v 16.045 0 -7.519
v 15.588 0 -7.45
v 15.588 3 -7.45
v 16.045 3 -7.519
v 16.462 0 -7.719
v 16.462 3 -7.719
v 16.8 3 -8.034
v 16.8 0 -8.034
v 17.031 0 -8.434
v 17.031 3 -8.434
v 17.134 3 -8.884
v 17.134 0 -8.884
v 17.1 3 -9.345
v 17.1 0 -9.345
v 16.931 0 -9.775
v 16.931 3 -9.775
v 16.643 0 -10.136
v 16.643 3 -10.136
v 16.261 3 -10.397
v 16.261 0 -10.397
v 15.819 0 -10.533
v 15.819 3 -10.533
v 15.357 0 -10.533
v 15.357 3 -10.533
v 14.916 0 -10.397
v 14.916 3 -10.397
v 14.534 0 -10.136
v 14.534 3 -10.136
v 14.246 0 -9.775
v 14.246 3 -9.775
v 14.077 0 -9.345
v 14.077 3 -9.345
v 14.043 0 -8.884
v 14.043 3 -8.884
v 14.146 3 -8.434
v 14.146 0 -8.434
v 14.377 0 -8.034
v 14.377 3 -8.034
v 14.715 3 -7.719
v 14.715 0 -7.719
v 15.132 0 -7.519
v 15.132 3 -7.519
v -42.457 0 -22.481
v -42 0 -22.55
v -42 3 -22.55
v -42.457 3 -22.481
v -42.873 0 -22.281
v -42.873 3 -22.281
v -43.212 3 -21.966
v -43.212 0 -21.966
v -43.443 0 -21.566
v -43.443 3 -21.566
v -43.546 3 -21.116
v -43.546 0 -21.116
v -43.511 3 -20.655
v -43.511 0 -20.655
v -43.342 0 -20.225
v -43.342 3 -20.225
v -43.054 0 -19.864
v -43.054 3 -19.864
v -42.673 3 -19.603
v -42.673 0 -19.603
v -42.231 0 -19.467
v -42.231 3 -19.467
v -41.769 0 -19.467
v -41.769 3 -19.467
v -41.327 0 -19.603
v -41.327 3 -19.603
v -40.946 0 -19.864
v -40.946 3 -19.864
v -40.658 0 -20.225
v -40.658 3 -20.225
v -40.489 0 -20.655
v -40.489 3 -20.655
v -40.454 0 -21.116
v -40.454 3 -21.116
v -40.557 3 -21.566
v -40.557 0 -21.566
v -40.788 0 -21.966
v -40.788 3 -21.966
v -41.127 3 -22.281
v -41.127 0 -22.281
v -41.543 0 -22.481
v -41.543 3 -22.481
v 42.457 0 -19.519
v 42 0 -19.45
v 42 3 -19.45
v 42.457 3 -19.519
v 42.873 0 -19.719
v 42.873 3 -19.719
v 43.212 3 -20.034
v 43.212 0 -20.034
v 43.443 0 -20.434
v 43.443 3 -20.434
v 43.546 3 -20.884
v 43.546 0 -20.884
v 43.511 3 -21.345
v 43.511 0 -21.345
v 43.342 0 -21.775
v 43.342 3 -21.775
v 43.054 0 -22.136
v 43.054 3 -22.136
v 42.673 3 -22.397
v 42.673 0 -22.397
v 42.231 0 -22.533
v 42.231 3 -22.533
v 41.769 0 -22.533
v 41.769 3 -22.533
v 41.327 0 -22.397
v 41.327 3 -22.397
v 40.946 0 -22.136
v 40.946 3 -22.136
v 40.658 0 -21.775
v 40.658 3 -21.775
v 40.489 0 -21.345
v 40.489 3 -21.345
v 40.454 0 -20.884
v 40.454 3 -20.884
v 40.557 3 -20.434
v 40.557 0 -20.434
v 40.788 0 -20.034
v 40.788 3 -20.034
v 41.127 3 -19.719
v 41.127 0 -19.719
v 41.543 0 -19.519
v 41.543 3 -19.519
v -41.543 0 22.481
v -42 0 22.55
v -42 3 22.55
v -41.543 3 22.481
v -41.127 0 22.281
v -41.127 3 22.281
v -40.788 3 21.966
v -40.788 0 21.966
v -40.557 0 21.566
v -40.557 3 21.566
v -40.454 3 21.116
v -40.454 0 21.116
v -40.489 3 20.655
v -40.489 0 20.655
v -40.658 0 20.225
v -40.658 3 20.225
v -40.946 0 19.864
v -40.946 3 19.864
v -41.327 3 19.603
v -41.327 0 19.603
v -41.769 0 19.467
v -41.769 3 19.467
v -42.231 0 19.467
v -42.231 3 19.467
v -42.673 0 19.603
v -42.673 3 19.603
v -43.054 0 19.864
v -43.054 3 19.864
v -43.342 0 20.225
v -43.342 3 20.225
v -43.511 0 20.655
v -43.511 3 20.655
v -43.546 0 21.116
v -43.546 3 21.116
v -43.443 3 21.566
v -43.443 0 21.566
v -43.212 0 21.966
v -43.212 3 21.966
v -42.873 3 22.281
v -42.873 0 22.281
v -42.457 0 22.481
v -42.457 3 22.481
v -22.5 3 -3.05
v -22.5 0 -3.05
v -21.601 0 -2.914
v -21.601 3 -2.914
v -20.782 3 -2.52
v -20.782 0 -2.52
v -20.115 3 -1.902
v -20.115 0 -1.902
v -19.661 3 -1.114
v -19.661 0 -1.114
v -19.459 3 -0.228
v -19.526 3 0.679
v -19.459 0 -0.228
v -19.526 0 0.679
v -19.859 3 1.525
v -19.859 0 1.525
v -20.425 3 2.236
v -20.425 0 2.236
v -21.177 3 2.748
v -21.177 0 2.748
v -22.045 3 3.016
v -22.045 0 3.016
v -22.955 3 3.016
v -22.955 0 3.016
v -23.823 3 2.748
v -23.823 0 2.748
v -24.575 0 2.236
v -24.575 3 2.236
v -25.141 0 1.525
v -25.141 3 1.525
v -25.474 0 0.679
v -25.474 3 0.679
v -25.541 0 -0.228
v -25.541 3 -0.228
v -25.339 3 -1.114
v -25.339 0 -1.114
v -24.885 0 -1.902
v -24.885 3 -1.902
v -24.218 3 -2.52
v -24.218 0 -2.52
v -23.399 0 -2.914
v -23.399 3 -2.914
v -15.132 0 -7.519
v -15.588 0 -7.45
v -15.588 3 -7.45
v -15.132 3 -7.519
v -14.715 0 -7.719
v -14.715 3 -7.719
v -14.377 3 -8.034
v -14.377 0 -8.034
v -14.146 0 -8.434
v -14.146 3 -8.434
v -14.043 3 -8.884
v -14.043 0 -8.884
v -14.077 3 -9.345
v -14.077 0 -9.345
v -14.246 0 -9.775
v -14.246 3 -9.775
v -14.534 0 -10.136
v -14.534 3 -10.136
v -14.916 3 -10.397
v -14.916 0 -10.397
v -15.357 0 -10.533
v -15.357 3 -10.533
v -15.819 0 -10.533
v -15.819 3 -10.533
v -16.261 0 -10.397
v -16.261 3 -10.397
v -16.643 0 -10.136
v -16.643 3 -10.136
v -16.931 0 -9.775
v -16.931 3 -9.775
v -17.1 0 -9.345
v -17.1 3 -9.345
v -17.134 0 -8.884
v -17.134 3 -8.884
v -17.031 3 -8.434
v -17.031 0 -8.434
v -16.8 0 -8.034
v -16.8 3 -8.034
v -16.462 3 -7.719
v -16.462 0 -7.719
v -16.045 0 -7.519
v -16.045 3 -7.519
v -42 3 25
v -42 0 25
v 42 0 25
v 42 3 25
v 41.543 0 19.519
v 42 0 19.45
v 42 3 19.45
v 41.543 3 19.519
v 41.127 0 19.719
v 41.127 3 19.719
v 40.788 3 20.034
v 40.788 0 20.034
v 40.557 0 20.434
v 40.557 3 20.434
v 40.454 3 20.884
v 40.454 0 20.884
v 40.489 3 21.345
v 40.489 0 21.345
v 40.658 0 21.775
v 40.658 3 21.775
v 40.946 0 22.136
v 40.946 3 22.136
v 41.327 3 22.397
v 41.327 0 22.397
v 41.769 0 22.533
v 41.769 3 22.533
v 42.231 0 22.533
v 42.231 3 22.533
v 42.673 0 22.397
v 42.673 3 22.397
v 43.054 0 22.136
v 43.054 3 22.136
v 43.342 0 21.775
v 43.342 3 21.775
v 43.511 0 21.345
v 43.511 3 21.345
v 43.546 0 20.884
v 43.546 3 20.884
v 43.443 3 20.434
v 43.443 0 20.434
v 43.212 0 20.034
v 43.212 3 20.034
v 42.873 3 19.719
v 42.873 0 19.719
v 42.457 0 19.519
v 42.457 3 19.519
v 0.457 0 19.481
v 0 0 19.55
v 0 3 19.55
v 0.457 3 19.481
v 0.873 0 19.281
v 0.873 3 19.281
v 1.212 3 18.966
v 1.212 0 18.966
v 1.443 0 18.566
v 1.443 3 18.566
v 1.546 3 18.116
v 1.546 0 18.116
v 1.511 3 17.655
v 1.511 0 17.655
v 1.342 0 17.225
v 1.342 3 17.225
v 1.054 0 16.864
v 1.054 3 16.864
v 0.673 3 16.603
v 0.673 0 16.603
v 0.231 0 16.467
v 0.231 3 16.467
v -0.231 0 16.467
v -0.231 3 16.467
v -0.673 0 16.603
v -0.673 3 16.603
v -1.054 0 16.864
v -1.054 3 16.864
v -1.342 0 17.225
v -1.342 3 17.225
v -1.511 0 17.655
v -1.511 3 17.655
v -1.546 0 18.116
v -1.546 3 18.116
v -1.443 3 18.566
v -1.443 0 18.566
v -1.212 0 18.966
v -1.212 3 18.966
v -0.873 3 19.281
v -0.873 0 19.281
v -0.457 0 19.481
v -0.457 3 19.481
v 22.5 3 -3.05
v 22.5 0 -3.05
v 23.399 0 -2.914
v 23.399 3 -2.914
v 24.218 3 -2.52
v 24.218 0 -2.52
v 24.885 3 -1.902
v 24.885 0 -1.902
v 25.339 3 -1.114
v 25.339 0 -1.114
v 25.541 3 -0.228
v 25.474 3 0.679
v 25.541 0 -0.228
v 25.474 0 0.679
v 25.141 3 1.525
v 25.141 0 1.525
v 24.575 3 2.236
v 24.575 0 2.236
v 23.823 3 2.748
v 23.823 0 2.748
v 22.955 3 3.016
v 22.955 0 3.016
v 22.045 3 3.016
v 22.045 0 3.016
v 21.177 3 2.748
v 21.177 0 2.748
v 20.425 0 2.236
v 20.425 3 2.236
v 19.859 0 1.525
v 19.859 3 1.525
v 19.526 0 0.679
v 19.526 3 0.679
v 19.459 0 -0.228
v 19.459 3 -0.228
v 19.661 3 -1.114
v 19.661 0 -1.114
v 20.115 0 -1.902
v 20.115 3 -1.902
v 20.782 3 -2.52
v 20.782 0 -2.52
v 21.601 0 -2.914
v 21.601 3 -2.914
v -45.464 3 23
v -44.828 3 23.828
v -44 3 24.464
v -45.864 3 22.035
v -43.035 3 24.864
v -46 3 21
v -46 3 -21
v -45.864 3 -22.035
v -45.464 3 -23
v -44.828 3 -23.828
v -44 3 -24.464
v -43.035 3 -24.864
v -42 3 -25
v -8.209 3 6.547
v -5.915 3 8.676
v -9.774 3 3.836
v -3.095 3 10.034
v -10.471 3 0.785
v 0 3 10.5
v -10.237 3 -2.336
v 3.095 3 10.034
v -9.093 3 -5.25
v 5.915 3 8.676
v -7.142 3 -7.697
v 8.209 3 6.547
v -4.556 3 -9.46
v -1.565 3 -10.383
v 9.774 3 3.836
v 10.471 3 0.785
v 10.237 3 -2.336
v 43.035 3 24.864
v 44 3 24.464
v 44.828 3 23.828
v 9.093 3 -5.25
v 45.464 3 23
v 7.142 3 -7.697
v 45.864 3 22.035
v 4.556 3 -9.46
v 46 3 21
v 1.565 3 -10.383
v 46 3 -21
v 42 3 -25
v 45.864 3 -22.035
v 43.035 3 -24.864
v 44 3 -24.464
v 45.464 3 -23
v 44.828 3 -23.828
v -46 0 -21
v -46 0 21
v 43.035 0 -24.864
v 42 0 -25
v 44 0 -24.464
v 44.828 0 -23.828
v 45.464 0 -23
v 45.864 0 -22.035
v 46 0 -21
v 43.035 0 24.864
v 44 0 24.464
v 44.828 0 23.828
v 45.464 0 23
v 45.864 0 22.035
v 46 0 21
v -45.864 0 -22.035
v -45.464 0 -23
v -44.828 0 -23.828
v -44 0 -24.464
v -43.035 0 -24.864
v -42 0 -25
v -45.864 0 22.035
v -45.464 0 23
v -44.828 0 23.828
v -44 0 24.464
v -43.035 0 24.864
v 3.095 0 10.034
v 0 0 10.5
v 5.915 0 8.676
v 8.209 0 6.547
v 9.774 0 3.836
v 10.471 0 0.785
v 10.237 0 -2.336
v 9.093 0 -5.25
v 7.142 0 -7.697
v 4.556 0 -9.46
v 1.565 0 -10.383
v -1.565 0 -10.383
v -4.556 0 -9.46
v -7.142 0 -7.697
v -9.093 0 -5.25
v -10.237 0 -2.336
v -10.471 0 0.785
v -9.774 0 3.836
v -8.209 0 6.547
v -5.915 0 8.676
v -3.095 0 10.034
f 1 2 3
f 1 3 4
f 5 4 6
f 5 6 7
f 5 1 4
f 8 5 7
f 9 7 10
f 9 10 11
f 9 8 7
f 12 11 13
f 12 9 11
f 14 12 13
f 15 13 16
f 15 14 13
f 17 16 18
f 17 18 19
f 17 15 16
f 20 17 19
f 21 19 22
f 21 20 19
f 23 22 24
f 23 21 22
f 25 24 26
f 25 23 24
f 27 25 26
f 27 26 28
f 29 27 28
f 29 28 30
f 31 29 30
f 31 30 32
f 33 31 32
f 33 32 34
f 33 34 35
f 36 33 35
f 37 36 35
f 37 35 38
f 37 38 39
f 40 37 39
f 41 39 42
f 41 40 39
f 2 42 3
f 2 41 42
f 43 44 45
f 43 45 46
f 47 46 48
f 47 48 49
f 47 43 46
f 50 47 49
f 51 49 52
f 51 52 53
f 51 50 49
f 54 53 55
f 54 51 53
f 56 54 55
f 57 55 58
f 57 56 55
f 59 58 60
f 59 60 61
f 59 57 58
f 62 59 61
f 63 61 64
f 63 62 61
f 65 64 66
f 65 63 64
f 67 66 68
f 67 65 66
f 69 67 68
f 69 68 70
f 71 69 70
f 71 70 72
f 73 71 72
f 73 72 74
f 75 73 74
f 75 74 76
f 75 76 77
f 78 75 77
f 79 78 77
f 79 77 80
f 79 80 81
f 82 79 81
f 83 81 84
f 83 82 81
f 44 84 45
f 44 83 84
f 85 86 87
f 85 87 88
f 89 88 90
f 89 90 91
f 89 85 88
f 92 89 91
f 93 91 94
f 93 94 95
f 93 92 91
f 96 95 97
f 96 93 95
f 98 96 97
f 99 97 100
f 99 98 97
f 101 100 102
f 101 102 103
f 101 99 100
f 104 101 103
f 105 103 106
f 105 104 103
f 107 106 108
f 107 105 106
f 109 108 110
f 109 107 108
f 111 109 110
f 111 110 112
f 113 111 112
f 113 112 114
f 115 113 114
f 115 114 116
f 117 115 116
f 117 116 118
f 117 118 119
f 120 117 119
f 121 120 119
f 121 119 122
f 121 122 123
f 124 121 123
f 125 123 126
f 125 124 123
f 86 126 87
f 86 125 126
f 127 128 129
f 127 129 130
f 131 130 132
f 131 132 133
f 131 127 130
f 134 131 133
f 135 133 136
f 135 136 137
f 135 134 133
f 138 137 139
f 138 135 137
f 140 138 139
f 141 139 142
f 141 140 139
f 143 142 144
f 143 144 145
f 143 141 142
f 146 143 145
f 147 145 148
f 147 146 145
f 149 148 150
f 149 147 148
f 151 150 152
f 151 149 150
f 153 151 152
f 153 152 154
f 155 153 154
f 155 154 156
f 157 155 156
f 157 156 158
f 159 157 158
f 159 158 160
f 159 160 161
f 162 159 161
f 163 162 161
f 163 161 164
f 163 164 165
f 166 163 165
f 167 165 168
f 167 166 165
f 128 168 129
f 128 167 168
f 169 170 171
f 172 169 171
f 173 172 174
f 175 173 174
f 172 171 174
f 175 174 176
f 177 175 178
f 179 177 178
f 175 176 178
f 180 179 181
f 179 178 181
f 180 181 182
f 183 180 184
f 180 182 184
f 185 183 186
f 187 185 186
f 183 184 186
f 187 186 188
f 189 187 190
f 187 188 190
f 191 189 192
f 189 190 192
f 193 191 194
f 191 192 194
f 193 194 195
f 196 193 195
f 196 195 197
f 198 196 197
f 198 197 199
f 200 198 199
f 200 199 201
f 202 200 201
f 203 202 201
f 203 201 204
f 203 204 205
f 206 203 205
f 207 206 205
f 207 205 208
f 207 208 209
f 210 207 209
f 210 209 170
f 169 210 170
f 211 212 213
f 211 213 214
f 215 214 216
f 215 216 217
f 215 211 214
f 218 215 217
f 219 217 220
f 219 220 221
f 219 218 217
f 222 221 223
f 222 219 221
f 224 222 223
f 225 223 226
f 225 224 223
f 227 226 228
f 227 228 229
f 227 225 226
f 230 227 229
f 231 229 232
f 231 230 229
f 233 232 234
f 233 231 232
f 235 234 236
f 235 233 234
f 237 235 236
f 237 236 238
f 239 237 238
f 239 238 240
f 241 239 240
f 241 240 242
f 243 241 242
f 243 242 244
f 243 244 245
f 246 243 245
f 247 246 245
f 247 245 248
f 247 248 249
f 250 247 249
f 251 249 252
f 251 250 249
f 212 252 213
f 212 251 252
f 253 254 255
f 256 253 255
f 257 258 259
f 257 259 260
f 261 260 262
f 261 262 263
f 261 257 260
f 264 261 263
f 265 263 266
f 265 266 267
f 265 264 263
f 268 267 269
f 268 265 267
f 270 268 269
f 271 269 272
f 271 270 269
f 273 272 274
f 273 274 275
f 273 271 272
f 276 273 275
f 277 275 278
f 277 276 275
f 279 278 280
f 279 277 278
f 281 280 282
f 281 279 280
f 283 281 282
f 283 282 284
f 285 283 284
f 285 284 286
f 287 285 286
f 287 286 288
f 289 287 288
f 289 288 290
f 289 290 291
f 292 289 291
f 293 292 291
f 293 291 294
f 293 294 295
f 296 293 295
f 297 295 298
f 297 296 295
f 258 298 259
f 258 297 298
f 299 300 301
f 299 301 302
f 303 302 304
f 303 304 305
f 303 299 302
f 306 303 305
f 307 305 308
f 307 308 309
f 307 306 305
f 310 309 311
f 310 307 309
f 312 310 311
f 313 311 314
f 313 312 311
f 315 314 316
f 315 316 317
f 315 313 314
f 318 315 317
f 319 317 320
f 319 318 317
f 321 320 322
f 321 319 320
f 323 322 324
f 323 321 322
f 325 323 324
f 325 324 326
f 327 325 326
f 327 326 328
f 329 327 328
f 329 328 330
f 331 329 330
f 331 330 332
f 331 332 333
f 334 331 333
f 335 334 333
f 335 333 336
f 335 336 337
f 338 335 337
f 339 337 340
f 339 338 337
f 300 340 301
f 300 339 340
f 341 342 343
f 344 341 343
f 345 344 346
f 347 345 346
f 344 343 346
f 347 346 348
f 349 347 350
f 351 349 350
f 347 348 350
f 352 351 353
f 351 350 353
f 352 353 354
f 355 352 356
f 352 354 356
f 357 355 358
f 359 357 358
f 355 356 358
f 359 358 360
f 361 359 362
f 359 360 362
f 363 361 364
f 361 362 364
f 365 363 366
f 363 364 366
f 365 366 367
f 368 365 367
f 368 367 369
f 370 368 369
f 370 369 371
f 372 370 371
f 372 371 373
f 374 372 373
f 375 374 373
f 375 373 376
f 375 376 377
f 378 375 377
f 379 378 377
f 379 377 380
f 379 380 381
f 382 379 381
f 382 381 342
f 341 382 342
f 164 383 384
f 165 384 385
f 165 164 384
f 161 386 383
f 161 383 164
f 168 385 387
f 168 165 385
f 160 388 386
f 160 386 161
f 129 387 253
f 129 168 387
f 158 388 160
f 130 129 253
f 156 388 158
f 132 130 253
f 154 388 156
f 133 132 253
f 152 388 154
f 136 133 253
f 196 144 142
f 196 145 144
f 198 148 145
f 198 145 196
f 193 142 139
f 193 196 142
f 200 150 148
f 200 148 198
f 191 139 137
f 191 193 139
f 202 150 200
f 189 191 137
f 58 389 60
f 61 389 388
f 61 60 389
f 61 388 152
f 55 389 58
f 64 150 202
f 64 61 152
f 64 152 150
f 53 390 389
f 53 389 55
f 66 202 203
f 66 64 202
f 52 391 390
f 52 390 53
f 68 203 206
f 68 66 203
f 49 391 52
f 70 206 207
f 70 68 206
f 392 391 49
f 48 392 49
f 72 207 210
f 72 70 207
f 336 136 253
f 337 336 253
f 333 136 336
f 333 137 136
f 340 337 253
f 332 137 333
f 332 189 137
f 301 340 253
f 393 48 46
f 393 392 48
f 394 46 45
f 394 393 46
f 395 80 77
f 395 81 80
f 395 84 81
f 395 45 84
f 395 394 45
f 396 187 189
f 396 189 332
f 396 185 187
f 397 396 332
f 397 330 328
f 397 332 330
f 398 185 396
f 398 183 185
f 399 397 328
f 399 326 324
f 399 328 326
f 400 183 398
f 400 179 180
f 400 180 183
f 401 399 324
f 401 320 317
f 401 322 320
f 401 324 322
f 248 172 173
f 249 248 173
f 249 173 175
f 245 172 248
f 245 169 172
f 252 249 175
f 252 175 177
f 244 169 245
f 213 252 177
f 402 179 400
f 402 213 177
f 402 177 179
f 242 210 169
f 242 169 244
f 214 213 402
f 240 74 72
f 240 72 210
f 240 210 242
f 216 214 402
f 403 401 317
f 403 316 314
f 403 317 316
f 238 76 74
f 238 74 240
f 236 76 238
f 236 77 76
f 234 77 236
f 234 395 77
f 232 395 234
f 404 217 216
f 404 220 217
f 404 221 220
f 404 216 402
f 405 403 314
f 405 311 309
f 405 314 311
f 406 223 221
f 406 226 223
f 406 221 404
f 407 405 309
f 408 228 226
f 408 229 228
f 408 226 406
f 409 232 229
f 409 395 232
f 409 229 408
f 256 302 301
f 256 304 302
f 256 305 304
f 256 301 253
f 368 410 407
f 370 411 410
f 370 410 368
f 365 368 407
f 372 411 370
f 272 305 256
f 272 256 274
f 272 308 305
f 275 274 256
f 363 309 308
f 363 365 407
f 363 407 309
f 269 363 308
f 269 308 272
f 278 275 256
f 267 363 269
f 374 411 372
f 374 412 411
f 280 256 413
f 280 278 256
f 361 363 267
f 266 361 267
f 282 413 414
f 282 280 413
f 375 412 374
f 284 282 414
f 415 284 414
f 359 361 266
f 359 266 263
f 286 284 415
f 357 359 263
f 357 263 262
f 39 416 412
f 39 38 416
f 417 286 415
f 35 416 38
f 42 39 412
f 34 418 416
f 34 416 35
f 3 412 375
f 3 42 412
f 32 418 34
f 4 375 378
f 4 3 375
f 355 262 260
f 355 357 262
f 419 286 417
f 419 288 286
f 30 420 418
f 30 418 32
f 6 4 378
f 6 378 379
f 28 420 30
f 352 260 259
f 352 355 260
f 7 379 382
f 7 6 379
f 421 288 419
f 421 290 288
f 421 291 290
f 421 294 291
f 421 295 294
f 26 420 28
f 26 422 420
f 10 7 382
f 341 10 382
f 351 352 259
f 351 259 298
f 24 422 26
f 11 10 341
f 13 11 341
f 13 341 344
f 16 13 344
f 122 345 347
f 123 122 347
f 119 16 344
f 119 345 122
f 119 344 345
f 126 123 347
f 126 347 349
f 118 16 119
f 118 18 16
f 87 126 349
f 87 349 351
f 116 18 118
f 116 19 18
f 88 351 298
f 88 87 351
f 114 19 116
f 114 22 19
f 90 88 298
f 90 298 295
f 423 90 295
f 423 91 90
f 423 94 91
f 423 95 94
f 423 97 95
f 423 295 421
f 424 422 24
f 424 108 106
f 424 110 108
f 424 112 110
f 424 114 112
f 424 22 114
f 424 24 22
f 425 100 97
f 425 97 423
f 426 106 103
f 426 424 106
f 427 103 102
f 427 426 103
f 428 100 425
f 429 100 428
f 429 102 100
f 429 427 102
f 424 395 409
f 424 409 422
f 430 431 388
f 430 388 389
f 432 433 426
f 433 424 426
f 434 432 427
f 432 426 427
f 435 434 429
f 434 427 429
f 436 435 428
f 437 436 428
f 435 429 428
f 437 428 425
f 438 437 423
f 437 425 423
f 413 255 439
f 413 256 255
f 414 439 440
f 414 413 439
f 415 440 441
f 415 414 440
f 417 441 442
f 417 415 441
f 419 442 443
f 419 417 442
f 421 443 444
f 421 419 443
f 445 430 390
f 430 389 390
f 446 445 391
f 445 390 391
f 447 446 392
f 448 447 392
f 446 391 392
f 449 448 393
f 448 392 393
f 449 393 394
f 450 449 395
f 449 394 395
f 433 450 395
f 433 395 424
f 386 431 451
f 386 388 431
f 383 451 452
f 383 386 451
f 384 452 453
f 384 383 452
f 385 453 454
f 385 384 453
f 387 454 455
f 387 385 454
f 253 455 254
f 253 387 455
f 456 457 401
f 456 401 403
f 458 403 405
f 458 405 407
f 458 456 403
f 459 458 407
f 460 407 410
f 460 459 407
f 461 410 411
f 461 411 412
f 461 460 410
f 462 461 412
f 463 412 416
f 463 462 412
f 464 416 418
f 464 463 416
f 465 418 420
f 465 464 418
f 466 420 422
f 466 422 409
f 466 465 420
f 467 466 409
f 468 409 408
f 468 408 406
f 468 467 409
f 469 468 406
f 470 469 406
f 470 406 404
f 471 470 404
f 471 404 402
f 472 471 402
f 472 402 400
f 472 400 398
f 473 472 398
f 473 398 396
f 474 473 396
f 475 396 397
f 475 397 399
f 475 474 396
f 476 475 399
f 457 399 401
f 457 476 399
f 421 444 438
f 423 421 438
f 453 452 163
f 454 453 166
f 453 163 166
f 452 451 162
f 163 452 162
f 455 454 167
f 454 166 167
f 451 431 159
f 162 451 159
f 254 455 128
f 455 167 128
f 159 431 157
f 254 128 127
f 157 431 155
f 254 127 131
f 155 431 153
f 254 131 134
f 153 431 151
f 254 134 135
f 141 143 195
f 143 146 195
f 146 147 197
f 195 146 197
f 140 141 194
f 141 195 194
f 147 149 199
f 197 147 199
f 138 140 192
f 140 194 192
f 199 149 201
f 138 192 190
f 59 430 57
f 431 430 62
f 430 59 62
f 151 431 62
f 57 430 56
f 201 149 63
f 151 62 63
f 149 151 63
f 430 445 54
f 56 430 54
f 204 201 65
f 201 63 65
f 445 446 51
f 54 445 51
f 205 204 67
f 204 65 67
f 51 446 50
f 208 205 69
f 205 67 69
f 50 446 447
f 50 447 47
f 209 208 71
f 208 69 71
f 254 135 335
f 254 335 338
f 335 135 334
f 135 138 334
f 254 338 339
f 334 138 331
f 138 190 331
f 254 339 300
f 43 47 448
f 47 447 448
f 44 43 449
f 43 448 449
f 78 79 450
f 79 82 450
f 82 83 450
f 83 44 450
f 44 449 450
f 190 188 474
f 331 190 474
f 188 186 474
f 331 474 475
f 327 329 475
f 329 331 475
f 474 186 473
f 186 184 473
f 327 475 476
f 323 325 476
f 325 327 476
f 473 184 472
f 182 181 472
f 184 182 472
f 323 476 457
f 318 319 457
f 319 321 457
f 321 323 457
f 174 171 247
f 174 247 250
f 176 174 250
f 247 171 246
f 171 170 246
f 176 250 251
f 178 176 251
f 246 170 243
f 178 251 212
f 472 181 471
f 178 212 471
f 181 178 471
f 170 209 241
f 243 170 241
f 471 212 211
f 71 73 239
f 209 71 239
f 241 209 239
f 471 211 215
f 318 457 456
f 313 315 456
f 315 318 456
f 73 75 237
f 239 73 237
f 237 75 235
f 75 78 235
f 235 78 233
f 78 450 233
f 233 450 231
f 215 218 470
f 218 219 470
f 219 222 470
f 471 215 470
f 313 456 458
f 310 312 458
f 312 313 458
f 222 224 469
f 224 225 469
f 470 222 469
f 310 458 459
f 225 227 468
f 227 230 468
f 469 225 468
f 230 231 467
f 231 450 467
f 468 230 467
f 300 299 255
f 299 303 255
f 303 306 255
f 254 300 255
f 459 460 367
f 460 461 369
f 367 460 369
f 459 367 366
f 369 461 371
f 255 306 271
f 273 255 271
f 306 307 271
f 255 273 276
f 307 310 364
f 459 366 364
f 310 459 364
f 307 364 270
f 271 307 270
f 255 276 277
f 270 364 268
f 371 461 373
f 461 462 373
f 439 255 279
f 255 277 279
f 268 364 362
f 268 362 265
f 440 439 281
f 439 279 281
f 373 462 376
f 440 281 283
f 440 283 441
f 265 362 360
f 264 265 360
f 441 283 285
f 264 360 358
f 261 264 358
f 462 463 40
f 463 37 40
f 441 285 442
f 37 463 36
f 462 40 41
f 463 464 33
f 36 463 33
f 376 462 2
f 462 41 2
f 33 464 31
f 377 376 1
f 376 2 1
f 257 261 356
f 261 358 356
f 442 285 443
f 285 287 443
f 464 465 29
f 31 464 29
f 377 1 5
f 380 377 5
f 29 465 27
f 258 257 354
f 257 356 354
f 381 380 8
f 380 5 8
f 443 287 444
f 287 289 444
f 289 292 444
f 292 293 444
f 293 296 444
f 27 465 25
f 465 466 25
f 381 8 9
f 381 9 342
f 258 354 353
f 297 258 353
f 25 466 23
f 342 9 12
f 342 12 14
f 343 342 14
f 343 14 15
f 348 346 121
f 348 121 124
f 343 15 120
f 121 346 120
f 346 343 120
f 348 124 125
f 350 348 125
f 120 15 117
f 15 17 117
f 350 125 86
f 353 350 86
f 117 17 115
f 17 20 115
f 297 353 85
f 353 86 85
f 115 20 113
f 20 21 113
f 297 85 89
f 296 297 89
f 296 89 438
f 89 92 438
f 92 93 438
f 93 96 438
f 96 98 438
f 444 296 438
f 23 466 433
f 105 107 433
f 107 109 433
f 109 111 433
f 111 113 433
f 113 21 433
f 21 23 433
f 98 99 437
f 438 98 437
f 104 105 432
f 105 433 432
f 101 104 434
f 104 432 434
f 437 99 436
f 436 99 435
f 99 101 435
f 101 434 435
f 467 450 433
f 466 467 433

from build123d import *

# Parameters (mm, degrees)
SKETCH1_W           = 92
SKETCH1_H           = 50
SKETCH1_R           = 10.5
SKETCH1_R_2         = 1.55
BOSS_EXTRUDE1_DEPTH = 3
FILLET1_R           = 4
SKETCH_1_R          = 3.05
CUT_EXTRUDE_1_DEPTH = 10


with BuildPart() as part:
    # Sketch1 → Boss-Extrude1 (new body)
    with BuildSketch(Plane(origin=(0, 0, 0), x_dir=(1, 0, 0), z_dir=(0, 1, 0))):
        Rectangle(SKETCH1_W, SKETCH1_H)
        with Locations(Location((0, 0, 0), (0, 0, 270))):
            Circle(SKETCH1_R, mode=Mode.SUBTRACT)
        with Locations(Location((42, 21, 0), (0, 0, 270))):
            Circle(SKETCH1_R_2, mode=Mode.SUBTRACT)
        with Locations(Location((-42, 21, 0), (0, 0, 90))):
            Circle(SKETCH1_R_2, mode=Mode.SUBTRACT)
        with Locations(Location((42, -21, 0), (0, 0, 90))):
            Circle(SKETCH1_R_2, mode=Mode.SUBTRACT)
        with Locations(Location((-42, -21, 0), (0, 0, 270))):
            Circle(SKETCH1_R_2, mode=Mode.SUBTRACT)
        with Locations(Location((0, -18, 0), (0, 0, 270))):
            Circle(SKETCH1_R_2, mode=Mode.SUBTRACT)
        with Locations(Location((-15.588457268, 9, 0), (0, 0, 270))):
            Circle(SKETCH1_R_2, mode=Mode.SUBTRACT)
        with Locations(Location((15.588457268, 9, 0), (0, 0, 270))):
            Circle(SKETCH1_R_2, mode=Mode.SUBTRACT)
    extrude(amount=BOSS_EXTRUDE1_DEPTH)

    # Fillet1
    fillet1_edges = [part.edges().sort_by_distance(p)[0] for p in [
        (46, 1.5, 25),
        (-46, 1.5, 25),
        (-46, 1.5, -25),
        (46, 1.5, -25),
    ]]
    fillet(fillet1_edges, radius=FILLET1_R)

    # 草图1 → 切除-拉伸1 (cut)
    with BuildSketch(Plane.XZ):
        with Locations(Location((-22.5, 0, 0), (0, 0, 270))):
            Circle(SKETCH_1_R)
        with Locations(Location((22.5, 0, 0), (0, 0, 270))):
            Circle(SKETCH_1_R)
    extrude(amount=-CUT_EXTRUDE_1_DEPTH, mode=Mode.SUBTRACT)


solid = part.part
